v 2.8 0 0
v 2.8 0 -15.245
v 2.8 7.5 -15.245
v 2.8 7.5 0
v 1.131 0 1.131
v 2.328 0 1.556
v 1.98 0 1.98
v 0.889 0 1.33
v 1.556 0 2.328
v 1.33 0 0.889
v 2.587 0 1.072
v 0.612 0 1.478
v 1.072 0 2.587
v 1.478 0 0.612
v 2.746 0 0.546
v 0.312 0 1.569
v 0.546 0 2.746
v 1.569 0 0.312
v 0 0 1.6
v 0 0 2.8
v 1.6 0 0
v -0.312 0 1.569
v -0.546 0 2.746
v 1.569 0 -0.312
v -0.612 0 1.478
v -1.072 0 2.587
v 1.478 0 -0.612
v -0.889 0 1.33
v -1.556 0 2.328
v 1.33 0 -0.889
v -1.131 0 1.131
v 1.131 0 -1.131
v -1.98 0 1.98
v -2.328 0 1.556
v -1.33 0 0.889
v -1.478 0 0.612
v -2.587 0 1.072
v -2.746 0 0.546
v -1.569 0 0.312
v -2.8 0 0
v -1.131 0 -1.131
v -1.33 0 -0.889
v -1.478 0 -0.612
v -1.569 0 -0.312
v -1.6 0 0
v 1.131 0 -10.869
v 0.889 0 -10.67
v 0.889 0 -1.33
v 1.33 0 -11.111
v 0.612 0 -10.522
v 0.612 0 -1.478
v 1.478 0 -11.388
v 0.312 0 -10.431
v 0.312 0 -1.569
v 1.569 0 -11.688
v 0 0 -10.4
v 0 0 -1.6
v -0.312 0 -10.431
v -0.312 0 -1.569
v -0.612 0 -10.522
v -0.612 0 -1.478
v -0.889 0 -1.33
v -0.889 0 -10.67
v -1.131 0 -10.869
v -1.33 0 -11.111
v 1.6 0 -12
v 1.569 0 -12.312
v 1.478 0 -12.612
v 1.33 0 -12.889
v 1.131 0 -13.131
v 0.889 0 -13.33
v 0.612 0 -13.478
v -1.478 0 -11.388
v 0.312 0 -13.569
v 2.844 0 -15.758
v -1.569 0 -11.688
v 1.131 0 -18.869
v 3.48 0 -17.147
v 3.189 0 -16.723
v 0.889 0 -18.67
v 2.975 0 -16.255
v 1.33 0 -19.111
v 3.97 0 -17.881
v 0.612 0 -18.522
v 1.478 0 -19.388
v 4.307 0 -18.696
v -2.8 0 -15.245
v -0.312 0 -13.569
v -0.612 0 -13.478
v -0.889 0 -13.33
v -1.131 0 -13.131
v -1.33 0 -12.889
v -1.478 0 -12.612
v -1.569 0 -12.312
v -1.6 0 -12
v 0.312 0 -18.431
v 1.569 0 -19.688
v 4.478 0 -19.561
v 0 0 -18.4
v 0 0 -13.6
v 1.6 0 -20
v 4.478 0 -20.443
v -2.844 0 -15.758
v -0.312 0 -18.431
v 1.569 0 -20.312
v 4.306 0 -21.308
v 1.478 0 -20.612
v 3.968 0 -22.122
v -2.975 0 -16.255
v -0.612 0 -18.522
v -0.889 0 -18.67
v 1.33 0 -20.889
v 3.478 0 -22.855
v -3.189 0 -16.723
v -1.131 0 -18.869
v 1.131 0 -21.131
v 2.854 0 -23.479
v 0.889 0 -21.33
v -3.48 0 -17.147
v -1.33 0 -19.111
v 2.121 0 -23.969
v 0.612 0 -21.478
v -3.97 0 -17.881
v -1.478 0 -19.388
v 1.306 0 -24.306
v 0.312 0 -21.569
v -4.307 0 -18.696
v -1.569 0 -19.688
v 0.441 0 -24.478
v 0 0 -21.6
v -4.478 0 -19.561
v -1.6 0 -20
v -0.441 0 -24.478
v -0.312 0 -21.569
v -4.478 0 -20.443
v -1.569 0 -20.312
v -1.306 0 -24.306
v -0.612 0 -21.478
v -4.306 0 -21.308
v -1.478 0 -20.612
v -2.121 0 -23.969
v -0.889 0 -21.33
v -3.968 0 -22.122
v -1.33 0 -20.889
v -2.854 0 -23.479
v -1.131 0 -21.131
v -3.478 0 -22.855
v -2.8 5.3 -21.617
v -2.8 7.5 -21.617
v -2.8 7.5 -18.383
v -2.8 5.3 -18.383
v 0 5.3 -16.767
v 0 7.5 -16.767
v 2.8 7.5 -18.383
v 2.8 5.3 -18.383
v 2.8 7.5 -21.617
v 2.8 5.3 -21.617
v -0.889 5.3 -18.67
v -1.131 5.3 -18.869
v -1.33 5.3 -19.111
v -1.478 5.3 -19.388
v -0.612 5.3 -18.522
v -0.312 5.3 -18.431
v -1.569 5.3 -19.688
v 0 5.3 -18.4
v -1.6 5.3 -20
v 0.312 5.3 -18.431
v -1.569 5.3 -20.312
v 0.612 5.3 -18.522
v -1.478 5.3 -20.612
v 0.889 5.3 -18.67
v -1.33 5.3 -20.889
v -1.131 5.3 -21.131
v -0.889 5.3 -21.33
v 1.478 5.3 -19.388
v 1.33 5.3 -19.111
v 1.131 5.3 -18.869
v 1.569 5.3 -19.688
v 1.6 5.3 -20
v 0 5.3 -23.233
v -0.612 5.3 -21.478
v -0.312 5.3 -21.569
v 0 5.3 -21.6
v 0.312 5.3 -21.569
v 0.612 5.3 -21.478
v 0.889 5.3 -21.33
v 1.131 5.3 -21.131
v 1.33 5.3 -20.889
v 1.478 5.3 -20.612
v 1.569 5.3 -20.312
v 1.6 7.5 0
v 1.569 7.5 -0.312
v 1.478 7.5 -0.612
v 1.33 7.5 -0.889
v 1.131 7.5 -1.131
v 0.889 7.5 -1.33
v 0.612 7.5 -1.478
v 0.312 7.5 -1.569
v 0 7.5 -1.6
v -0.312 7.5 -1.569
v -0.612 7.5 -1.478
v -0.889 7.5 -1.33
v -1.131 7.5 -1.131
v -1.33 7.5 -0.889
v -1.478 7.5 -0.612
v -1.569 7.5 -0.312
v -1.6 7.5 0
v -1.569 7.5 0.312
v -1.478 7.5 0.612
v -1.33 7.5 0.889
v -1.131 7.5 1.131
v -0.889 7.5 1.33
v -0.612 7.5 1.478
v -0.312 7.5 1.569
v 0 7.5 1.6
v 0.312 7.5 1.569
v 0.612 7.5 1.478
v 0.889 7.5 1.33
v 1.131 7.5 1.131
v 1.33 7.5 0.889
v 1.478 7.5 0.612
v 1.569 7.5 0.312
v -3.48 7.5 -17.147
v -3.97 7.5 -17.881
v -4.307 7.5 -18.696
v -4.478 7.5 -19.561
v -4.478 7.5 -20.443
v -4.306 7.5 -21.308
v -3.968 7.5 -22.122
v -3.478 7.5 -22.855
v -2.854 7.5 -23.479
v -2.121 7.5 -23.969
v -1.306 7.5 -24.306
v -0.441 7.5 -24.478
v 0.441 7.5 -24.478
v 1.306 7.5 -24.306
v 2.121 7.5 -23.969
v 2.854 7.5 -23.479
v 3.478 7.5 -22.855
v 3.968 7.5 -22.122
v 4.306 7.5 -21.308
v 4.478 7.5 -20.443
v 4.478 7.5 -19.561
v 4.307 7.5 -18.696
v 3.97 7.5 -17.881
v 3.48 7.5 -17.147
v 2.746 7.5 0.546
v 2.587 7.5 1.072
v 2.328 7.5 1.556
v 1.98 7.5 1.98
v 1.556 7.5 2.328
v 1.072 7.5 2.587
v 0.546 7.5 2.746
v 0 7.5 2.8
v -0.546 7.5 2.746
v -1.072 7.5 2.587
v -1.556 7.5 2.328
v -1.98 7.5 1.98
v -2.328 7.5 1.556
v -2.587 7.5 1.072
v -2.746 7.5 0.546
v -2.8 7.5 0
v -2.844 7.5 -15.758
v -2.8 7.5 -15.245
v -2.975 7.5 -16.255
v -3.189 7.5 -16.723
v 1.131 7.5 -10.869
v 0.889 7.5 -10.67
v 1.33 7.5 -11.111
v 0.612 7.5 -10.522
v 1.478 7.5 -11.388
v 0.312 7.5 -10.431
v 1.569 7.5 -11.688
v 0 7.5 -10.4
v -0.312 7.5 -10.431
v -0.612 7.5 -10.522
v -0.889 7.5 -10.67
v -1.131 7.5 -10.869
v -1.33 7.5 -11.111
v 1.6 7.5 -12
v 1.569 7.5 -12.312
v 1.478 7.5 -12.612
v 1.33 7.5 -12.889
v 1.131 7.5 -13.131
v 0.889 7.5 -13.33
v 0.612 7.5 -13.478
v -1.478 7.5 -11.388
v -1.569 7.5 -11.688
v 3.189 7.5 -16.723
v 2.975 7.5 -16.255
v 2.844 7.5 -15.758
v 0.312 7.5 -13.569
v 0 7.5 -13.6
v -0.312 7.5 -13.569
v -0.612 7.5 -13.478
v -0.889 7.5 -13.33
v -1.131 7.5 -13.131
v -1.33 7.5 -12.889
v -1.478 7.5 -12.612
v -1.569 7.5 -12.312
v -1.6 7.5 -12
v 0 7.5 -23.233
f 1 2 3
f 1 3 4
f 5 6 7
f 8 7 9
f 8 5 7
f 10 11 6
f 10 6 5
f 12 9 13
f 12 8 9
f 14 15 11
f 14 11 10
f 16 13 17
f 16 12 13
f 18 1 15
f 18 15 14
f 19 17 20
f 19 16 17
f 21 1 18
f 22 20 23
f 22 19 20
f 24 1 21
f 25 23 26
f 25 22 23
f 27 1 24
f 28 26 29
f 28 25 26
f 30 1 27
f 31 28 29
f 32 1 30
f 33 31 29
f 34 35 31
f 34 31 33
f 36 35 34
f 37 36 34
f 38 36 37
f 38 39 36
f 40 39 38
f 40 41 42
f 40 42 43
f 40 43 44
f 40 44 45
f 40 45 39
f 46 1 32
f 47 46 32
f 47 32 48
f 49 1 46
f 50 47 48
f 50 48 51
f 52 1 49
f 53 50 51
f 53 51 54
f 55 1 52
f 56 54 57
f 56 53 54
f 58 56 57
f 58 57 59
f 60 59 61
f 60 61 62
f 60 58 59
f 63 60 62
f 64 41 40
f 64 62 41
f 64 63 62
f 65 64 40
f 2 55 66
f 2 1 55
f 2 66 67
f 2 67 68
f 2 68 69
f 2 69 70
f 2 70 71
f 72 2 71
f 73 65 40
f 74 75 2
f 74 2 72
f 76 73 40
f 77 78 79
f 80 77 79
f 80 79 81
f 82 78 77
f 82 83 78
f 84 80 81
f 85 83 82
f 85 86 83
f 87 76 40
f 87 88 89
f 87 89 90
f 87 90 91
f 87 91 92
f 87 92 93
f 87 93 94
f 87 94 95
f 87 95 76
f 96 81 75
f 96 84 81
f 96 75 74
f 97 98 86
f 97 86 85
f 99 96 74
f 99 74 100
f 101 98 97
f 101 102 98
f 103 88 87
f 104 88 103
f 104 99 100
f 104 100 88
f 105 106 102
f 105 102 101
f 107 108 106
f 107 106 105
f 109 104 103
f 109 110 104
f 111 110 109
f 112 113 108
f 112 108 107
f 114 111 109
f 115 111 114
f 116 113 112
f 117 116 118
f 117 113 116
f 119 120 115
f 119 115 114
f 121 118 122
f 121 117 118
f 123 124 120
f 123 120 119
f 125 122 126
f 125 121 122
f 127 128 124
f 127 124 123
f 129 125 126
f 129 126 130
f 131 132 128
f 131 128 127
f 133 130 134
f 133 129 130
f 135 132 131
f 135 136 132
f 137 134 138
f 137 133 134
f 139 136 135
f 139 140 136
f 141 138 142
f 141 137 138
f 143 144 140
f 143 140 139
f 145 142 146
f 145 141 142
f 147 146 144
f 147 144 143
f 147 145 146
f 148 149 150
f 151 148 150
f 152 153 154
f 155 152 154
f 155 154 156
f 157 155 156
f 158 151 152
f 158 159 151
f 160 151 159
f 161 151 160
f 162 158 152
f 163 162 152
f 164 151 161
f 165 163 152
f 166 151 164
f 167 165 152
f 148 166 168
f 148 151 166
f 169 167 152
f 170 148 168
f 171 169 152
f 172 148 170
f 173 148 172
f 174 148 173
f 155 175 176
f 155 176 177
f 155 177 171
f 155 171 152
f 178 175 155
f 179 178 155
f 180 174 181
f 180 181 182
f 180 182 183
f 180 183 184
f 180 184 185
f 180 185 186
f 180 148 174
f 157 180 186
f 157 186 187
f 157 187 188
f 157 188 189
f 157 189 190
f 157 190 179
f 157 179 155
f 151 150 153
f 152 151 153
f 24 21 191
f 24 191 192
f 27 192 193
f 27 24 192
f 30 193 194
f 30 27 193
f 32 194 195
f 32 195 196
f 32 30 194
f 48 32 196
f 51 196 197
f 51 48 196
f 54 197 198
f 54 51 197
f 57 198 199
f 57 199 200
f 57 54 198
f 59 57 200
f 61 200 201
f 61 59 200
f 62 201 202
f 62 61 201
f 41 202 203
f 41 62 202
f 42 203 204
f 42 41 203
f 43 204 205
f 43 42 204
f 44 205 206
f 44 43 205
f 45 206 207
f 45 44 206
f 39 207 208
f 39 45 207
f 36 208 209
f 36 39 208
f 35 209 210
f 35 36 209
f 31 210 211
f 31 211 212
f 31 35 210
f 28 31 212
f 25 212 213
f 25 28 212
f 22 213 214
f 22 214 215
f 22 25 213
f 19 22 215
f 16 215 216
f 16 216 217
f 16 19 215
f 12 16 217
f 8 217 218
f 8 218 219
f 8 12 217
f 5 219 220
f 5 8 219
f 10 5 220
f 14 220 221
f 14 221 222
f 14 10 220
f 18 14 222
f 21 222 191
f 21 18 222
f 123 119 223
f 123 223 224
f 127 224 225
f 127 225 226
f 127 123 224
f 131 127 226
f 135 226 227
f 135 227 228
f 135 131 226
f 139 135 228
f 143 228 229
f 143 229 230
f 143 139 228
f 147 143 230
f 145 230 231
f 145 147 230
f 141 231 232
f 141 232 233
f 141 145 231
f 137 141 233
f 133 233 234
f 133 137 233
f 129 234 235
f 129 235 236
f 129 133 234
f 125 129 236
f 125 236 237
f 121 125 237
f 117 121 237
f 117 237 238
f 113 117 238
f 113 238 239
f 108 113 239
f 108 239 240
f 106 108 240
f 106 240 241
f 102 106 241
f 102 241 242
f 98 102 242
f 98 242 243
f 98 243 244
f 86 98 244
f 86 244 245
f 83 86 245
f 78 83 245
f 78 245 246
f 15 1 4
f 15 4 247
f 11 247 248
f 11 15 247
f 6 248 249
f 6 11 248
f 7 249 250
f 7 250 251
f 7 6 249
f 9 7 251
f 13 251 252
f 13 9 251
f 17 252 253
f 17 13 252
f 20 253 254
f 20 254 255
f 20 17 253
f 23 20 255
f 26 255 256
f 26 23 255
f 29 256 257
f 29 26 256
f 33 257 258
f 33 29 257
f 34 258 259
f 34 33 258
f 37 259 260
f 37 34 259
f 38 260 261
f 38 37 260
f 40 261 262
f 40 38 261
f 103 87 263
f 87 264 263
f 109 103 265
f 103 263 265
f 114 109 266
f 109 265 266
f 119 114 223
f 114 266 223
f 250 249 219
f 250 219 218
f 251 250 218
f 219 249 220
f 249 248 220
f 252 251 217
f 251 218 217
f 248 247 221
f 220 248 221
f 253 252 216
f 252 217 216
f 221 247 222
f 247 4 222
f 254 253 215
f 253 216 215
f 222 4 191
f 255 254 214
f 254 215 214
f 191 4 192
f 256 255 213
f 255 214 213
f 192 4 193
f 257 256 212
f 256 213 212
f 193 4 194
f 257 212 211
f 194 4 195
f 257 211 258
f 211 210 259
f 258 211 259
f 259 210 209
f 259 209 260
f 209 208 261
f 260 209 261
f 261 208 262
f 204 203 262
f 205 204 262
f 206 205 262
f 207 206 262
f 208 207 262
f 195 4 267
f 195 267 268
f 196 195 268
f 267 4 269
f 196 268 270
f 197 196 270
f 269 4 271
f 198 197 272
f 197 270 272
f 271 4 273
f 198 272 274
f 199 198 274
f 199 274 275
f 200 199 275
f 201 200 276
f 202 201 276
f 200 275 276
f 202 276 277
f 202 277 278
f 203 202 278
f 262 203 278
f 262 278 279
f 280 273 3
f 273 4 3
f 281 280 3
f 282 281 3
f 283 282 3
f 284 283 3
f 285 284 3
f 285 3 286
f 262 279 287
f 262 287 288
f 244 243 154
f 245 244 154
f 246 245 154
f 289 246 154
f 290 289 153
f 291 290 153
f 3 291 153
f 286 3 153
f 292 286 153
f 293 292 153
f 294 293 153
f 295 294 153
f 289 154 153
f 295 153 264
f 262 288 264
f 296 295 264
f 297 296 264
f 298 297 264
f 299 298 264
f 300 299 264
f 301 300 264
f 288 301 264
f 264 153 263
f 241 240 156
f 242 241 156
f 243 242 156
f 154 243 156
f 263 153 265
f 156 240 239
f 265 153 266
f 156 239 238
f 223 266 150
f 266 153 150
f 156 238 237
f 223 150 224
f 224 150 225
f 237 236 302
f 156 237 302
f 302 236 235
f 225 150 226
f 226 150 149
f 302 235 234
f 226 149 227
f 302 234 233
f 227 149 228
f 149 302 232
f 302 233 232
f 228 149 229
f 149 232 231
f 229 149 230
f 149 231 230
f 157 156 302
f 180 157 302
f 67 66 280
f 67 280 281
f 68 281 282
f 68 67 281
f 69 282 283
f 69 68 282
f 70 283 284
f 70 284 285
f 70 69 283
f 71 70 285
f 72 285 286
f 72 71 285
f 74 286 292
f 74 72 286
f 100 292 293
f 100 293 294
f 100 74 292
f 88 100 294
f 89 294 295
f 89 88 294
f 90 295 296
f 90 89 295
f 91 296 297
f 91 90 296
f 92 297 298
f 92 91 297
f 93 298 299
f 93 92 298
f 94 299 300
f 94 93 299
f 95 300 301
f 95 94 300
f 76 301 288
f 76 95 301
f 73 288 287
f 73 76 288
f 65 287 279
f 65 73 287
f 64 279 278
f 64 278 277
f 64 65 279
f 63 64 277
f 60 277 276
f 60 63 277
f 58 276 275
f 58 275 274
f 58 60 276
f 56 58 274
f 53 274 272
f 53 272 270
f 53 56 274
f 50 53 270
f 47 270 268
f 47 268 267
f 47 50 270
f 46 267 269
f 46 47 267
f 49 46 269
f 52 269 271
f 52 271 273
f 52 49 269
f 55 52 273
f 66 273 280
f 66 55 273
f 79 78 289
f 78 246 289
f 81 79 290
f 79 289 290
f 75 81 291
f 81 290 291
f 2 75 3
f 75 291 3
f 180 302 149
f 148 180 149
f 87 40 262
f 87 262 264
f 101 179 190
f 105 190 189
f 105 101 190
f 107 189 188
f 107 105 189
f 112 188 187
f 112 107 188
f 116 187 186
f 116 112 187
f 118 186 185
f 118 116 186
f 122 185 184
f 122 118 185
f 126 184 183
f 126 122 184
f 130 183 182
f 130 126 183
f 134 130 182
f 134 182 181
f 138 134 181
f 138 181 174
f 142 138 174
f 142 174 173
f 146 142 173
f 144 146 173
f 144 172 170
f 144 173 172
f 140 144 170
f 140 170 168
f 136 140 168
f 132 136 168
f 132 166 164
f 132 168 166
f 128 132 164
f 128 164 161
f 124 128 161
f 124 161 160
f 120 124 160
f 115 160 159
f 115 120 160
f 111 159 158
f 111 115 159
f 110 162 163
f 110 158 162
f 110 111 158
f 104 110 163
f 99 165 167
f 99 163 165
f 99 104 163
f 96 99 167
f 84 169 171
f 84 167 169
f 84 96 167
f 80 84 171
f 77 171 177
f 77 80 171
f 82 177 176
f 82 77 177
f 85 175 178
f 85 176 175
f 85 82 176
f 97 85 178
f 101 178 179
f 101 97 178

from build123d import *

# Parameters (mm, degrees)
SKETCH1_R           = 1.6
BOSS_EXTRUDE1_DEPTH = 7.5
CUT_EXTRUDE1_DEPTH  = 2.2
FILLET1_R           = 3


with BuildPart() as part:
    # Sketch1 → Boss-Extrude1 (new body)
    with BuildSketch(Plane(origin=(0, 0, 0), x_dir=(1, 0, 0), z_dir=(0, 1, 0))):
        with BuildLine():
            Line((-2.8, 0), (-2.8, 16.477217009))
            ThreePointArc((-2.8, 16.477217009), (0, 24.5), (2.8, 16.477217009))
            Line((2.8, 16.477217009), (2.8, 0))
            ThreePointArc((2.8, 0), (0, -2.8), (-2.8, 0))
        make_face()
        Circle(SKETCH1_R, mode=Mode.SUBTRACT)
        with Locations((0, 12)):
            Circle(SKETCH1_R, mode=Mode.SUBTRACT)
        with Locations((0, 20)):
            Circle(SKETCH1_R, mode=Mode.SUBTRACT)
    extrude(amount=BOSS_EXTRUDE1_DEPTH)

    # Sketch2 → Cut-Extrude1 (cut)
    with BuildSketch(Plane(origin=(0, 7.5, 0), x_dir=(1, 0, 0), z_dir=(0, 1, 0))):
        Polygon((0, 23.233161507), (-2.8, 21.616580754), (-2.8, 18.383419246), (0, 16.766838493), (2.8, 18.383419246), (2.8, 21.616580754), align=None)
    extrude(amount=-CUT_EXTRUDE1_DEPTH, mode=Mode.SUBTRACT)

    # Fillet1
    fillet1_edges = [part.edges().sort_by_distance(p)[0] for p in [
        (-2.8, 3.75, -16.477217009),
        (2.8, 3.75, -16.477217009),
    ]]
    fillet(fillet1_edges, radius=FILLET1_R)


solid = part.part
